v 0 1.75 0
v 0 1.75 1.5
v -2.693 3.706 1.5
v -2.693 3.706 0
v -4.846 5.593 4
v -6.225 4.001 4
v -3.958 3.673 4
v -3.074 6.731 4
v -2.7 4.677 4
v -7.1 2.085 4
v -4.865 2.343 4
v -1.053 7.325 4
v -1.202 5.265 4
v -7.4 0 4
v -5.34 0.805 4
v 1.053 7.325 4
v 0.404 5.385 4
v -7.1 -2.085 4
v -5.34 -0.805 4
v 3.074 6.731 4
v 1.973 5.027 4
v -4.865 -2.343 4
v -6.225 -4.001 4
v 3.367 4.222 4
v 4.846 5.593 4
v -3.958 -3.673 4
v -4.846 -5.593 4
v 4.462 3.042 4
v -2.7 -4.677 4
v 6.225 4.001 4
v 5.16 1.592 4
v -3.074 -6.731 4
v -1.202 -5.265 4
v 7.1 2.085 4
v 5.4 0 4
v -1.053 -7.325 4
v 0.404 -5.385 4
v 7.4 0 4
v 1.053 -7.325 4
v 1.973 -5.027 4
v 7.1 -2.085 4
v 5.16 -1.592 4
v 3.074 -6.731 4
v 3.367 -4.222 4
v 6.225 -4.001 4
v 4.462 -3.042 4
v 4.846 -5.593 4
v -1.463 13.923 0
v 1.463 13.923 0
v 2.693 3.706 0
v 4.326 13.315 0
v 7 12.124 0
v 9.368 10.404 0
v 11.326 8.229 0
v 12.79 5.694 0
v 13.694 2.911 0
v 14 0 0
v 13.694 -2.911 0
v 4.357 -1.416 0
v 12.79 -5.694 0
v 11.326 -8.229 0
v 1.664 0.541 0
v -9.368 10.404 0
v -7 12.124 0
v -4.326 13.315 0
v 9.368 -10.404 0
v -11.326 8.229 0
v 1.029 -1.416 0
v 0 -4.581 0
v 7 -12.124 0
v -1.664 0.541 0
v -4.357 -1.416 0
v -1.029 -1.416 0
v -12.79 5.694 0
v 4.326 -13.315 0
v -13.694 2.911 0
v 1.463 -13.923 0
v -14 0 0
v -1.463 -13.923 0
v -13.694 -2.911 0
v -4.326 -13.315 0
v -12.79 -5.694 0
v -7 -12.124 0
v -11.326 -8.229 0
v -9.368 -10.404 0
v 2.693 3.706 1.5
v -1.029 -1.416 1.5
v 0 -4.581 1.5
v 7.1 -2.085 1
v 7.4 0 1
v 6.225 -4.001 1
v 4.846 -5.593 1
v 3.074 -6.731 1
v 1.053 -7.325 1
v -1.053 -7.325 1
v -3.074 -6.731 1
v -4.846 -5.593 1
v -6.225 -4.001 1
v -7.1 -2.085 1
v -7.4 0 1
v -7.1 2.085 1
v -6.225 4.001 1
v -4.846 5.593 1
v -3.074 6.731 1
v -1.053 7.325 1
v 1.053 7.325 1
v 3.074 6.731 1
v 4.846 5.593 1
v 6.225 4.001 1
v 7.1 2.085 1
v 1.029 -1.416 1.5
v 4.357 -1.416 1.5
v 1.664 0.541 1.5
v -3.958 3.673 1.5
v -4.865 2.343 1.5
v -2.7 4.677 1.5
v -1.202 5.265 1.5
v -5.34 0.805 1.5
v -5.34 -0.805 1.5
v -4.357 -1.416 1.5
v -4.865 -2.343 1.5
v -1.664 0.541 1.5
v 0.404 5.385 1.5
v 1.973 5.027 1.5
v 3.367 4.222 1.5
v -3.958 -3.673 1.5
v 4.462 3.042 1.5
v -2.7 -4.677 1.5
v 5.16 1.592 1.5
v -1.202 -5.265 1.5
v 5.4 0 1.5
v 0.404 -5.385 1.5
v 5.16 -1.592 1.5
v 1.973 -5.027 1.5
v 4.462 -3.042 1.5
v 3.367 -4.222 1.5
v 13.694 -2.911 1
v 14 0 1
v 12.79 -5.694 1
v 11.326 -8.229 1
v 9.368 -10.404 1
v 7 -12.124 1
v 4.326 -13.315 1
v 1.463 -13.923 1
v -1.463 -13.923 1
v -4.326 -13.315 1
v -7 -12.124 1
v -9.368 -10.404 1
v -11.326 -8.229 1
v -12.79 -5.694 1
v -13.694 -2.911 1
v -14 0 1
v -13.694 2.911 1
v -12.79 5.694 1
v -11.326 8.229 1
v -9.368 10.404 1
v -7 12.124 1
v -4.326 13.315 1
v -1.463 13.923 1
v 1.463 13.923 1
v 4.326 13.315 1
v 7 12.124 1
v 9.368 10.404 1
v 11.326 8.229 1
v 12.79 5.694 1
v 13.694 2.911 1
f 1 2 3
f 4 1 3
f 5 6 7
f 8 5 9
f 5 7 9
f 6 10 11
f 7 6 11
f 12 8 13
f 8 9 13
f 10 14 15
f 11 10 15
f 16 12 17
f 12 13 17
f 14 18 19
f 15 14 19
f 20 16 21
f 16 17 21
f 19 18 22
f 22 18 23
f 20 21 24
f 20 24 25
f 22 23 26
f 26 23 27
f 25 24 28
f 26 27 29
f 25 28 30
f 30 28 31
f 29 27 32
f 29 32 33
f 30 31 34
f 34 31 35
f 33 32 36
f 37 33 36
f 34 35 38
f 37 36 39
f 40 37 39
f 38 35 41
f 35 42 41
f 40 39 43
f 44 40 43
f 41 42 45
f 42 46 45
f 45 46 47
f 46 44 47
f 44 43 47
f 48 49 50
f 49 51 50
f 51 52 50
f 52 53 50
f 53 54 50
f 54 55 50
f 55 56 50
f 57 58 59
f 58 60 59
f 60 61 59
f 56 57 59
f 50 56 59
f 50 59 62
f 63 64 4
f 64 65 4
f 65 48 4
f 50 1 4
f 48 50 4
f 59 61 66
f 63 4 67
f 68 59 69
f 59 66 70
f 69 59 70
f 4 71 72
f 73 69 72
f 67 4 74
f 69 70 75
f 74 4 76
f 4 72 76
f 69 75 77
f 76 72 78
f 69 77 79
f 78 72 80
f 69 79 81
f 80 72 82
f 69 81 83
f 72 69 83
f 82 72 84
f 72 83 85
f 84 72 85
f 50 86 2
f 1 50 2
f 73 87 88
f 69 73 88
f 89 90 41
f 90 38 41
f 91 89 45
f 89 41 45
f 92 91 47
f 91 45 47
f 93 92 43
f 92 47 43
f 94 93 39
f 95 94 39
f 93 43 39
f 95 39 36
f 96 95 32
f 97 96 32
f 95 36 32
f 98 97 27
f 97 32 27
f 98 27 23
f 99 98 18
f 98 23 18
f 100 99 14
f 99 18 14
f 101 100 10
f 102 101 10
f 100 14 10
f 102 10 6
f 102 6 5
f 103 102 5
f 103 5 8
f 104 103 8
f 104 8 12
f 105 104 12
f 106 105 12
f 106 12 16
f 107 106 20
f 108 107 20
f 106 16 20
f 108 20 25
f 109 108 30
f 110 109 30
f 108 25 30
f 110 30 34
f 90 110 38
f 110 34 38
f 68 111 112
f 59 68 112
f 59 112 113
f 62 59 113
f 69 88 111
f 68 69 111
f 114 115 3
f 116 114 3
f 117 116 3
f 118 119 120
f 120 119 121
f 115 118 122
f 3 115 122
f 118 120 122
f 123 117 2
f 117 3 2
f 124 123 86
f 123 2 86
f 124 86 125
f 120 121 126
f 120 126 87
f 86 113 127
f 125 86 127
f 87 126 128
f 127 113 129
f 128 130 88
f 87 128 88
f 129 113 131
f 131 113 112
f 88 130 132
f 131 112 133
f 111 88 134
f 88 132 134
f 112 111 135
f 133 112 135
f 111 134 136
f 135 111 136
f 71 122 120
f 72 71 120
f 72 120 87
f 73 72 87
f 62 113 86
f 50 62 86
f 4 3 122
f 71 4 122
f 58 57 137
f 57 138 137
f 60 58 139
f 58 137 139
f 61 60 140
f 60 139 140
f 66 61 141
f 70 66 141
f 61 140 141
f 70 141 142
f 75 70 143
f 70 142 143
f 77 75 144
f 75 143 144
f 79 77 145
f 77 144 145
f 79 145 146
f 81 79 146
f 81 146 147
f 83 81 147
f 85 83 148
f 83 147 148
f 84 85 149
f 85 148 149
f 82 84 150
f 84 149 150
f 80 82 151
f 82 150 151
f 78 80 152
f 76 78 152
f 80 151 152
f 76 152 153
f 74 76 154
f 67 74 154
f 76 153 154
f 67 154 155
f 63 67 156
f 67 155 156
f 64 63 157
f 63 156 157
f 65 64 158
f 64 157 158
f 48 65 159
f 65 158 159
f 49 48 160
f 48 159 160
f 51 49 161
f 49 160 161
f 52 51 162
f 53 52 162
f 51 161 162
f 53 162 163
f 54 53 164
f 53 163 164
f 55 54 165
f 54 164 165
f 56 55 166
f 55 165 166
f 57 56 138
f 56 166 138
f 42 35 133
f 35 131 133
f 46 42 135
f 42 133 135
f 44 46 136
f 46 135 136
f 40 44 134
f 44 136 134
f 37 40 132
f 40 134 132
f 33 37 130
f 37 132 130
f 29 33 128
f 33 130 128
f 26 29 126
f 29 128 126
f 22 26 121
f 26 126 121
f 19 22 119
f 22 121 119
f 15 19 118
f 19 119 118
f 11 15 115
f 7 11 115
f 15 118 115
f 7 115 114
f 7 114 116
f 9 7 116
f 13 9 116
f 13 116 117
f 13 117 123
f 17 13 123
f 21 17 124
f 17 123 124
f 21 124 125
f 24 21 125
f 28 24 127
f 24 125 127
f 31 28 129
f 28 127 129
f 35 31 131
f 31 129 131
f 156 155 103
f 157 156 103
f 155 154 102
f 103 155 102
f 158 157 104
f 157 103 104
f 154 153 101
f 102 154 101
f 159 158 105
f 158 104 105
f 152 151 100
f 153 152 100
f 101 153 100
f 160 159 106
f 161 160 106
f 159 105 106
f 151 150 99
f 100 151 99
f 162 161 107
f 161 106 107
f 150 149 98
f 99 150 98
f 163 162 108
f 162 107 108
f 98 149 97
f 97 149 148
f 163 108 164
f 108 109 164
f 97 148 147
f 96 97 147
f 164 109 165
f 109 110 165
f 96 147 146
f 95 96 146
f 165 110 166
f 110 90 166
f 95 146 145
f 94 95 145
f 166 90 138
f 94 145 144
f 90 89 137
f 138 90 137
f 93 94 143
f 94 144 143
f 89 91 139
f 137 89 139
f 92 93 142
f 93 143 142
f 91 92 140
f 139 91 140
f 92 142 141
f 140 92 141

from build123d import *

# Parameters (mm, degrees)
F3_DEPTH = 25


with BuildPart() as f1:
    # F0 (on Front) → F1 (revolve)
    with BuildSketch(Plane.XZ):
        Polygon((0, 1.5), (0, 0), (14, 0), (14, 1), (7.4, 1), (7.4, 4), (5.4, 4), (5.4, 1.5), align=None)
    revolve(axis=Axis((0, 0, 0.75), (0, 0, -1)))

    # F2 (on face) → F3 (cut)
    with BuildSketch(Plane.XY.offset(1.5)):
        Polygon((-1.0285587608, -1.4156896825), (-1.6642430343, 0.5407453412), (-4.3570448294, -1.4156896825), align=None)
        Polygon((0, 1.7498886826), (-2.6928017951, 3.7063237062), (-1.6642430343, 0.5407453412), align=None)
        Polygon((1.6642430343, 0.5407453412), (0, 1.7498886826), (-1.6642430343, 0.5407453412), (-1.0285587608, -1.4156896825), (1.0285587608, -1.4156896825), align=None)
        Polygon((2.6928017951, 3.7063237062), (0, 1.7498886826), (1.6642430343, 0.5407453412), align=None)
        Polygon((4.3570448294, -1.4156896825), (1.6642430343, 0.5407453412), (1.0285587608, -1.4156896825), align=None)
        Polygon((1.0285587608, -1.4156896825), (-1.0285587608, -1.4156896825), (0, -4.5812680475), align=None)
    extrude(amount=-F3_DEPTH, mode=Mode.SUBTRACT)


solid = f1.part
